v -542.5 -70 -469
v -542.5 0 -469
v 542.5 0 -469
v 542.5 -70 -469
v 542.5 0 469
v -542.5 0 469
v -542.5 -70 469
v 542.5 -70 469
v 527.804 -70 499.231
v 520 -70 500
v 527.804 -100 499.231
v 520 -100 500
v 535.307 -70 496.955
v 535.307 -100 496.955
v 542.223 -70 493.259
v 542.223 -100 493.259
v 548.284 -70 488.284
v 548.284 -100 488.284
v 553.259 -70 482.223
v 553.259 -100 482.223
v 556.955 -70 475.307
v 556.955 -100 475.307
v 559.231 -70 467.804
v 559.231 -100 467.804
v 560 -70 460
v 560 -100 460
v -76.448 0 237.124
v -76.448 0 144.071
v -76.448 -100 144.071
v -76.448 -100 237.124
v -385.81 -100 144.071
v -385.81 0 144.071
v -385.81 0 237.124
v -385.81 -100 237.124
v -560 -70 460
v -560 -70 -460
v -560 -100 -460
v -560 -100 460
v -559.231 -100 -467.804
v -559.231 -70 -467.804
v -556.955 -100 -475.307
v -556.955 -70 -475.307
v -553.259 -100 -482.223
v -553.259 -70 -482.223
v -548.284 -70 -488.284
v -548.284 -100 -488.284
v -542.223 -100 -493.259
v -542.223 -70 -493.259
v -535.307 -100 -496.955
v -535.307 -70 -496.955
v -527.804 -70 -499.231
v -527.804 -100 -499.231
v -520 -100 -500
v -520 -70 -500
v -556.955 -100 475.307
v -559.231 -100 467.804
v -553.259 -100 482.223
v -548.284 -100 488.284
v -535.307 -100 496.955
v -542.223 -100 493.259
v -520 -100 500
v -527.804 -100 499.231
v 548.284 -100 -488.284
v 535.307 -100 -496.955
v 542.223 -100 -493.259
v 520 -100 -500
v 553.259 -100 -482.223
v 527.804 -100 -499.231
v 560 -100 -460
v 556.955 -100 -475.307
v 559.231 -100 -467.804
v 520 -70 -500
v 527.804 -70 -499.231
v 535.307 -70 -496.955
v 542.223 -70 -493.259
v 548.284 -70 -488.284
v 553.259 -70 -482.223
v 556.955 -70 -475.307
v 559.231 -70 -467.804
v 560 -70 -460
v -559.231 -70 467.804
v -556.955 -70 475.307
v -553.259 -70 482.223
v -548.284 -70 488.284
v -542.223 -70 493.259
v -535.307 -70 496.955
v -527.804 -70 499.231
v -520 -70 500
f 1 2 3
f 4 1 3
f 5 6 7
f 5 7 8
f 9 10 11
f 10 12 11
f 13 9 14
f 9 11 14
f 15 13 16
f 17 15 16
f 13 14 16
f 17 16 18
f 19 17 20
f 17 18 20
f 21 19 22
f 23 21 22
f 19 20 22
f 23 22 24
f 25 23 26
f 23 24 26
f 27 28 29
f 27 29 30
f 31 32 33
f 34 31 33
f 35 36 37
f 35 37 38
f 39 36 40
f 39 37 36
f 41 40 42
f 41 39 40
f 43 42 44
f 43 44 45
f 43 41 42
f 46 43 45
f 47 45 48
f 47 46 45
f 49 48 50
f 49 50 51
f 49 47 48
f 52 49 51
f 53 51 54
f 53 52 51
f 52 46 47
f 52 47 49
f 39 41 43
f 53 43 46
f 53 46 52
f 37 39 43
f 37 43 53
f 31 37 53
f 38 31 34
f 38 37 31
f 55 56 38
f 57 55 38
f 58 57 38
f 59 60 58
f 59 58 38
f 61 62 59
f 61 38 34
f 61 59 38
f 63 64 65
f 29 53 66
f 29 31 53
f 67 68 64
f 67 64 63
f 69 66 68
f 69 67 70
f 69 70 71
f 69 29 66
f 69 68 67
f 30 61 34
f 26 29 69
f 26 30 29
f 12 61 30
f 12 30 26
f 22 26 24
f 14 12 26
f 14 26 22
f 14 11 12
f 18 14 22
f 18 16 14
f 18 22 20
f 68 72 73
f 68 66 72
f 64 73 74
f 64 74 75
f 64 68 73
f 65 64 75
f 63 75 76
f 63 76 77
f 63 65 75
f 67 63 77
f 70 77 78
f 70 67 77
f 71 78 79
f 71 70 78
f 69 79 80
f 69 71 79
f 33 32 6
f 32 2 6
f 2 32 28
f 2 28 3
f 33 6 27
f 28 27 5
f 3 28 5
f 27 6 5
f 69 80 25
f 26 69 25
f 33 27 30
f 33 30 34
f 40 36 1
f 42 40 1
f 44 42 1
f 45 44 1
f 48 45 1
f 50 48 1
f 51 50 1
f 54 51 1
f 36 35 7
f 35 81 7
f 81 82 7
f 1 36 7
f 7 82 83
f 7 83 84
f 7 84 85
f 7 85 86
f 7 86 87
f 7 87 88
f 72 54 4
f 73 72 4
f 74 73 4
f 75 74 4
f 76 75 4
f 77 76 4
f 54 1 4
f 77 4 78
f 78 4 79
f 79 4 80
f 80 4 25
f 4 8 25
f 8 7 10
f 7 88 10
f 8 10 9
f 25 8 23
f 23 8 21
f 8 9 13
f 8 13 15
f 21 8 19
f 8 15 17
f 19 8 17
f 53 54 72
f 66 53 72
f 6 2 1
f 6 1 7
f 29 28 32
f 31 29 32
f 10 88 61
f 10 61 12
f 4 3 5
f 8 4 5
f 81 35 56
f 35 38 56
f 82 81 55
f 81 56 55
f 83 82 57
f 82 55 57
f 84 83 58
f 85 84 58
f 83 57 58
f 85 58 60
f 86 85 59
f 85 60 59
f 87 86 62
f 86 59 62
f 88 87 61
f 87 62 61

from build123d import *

# Parameters (mm, degrees)
F0_W     = 1085
F0_H     = 938
F1_DEPTH = 70
F2_W     = 1120
F2_H     = 1000
F2_W_2   = 1085
F2_H_2   = 938
F3_DEPTH = 30
F4_W     = 309.3616962433
F4_H     = 93.0531620979
F5_DEPTH = 300
F6_R     = 40


with BuildPart() as f1:
    # F0 (on Front) → F1 (new body)
    with BuildSketch(Plane.XZ):
        Rectangle(F0_W, F0_H)
    extrude(amount=F1_DEPTH)

    # F2 (on face) → F3 (join)
    with BuildSketch(Plane.XZ.offset(70)):
        Rectangle(F2_W, F2_H)
        Rectangle(F2_W_2, F2_H_2, mode=Mode.SUBTRACT)
        Rectangle(F2_W_2, F2_H_2)
    extrude(amount=F3_DEPTH)

    # F4 (on face) → F5 (cut)
    with BuildSketch(Plane(origin=(0, 0, 0), x_dir=(-1, 0, 0), z_dir=(0, 1, 0))):
        with Locations((231.1289310455, 190.5976831913)):
            Rectangle(F4_W, F4_H)
    extrude(amount=-F5_DEPTH, mode=Mode.SUBTRACT)

    # F6
    f6_edges = [f1.edges().sort_by_distance(p)[0] for p in [
        (-560, -85, 500),
        (560, -85, 500),
        (560, -85, -500),
        (-560, -85, -500),
    ]]
    fillet(f6_edges, radius=F6_R)


solid = f1.part
